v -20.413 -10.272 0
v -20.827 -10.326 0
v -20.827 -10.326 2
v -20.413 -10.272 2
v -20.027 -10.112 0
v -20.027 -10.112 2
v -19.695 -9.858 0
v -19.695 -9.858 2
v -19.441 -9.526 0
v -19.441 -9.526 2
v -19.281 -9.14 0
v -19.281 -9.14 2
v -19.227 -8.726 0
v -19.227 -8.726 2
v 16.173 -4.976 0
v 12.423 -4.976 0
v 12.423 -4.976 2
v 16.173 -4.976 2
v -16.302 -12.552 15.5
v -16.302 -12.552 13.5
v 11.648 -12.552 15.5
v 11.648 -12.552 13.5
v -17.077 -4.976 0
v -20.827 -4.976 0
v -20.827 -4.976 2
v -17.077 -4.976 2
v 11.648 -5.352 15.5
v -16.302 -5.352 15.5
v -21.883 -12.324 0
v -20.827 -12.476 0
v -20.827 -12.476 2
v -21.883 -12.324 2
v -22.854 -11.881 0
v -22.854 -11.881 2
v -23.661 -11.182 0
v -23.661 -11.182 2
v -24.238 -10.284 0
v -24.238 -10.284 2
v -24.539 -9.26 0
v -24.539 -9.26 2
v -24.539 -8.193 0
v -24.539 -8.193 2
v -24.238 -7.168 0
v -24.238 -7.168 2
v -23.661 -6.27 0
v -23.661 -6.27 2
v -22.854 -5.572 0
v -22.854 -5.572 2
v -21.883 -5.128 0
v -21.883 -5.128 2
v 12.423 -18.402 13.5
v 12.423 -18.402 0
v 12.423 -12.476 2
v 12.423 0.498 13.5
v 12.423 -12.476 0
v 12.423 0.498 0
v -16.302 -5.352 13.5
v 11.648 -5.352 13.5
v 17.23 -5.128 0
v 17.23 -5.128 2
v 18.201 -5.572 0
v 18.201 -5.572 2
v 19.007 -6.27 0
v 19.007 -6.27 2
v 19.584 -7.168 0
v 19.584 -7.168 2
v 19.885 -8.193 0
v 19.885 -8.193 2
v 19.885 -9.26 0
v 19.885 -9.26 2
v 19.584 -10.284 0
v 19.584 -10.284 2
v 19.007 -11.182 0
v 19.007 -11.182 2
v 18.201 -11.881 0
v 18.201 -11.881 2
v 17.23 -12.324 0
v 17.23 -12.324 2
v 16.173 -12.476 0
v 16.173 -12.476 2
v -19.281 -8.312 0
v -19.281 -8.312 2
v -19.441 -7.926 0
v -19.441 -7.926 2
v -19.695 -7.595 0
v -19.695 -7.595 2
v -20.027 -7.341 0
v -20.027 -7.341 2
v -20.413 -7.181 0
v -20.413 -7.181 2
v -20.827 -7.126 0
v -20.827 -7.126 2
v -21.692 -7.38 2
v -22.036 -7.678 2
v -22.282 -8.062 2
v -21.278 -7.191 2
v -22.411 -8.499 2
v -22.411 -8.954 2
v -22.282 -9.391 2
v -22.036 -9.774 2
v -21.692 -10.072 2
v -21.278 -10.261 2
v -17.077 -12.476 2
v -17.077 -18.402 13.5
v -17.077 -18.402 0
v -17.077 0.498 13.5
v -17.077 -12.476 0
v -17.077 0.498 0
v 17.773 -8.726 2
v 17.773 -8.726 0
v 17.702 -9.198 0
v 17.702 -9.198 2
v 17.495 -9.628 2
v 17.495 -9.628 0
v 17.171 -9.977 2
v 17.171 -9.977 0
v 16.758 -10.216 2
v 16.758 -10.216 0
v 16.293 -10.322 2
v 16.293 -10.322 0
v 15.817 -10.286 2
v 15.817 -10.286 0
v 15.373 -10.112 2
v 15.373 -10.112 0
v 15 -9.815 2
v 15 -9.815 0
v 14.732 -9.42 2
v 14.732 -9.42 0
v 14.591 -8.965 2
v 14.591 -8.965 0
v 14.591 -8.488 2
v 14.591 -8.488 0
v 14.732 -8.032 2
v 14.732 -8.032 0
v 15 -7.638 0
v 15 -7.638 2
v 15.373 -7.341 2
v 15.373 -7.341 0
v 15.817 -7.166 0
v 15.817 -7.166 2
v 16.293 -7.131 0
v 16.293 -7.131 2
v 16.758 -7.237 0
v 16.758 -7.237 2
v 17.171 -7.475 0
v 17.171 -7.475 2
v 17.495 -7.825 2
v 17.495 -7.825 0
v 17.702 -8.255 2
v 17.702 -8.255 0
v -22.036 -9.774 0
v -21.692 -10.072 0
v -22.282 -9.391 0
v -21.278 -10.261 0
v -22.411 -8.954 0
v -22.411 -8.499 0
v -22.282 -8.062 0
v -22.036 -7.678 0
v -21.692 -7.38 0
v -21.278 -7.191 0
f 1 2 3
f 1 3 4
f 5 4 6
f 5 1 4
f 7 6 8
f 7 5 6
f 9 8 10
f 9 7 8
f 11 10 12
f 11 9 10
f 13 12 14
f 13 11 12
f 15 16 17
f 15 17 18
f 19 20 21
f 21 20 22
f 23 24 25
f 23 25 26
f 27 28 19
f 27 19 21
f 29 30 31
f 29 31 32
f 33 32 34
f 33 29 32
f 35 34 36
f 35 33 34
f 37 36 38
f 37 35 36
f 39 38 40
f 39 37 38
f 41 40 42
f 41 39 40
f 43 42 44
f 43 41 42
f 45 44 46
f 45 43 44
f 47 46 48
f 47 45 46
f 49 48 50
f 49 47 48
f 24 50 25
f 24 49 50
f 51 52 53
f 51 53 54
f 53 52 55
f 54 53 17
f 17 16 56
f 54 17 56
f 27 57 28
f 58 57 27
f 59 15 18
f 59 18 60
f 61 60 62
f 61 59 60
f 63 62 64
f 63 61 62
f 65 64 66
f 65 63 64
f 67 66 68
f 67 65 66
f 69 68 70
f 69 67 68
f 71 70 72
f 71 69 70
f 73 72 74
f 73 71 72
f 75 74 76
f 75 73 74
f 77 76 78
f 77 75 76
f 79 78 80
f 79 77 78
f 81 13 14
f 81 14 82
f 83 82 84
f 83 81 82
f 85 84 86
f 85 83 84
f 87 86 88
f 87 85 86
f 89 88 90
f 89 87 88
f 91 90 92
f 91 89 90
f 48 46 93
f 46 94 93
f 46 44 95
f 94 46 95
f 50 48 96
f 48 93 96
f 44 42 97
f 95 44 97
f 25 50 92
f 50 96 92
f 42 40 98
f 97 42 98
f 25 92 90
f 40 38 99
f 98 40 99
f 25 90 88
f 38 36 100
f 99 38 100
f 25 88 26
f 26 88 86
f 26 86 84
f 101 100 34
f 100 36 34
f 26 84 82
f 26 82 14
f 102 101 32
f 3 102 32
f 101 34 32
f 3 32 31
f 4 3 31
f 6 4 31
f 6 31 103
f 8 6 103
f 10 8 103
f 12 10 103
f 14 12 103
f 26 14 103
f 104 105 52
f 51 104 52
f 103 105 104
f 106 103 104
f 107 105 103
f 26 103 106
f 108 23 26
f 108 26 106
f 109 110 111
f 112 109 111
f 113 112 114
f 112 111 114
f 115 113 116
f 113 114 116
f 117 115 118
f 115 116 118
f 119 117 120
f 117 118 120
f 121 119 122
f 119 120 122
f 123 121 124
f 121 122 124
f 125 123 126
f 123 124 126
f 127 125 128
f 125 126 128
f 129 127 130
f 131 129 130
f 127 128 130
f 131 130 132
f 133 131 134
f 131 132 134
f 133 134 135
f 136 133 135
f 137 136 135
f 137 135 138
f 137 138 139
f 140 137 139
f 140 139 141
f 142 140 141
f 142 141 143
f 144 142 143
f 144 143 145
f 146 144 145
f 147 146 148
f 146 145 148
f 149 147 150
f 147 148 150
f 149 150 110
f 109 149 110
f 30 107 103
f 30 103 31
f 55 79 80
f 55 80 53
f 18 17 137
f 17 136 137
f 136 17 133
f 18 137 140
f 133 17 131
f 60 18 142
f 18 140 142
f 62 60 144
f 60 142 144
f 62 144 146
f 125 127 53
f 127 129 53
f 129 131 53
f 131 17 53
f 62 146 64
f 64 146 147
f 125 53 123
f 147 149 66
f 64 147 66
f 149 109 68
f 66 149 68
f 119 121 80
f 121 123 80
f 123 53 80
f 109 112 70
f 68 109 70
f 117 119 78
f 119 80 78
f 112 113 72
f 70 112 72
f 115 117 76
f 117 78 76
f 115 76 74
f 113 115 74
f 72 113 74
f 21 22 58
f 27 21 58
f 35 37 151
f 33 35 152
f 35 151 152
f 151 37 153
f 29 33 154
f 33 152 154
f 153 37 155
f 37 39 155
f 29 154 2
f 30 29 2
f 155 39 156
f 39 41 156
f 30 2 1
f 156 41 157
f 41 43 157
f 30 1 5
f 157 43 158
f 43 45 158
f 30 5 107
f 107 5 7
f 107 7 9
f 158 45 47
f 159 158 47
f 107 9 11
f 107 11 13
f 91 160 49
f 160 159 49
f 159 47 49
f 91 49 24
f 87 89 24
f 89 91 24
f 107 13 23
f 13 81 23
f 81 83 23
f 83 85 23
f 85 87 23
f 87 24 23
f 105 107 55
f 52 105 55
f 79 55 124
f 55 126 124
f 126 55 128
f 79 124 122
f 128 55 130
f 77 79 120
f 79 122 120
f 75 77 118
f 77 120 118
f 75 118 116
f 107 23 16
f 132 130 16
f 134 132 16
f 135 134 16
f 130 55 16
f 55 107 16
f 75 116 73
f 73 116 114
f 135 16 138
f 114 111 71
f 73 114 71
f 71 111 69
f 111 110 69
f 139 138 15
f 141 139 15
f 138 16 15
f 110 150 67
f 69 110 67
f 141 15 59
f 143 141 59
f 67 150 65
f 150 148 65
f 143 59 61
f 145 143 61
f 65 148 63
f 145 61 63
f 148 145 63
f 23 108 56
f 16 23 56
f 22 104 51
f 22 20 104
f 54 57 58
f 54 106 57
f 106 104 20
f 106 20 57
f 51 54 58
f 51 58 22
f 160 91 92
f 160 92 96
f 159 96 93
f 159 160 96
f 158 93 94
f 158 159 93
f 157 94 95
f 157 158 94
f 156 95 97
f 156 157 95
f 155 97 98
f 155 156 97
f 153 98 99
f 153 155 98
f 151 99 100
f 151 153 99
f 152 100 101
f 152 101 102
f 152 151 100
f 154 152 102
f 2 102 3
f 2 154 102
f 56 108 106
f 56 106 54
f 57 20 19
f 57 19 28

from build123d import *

# Parameters (mm, degrees)
F0_W     = 29.5
F0_H     = 18.9
F1_DEPTH = 13.5
F2_R     = 1.6
F3_DEPTH = 2
F4_W     = 27.95
F4_H     = 7.2
F5_DEPTH = 2


with BuildPart() as f1:
    # F0 (on Top) → F1 (new body)
    with BuildSketch(Plane.XY):
        with Locations((-2.3268059269, -8.9522809724)):
            Rectangle(F0_W, F0_H)
    extrude(amount=F1_DEPTH)

    # F2 (on face) → F3 (join)
    with BuildSketch(Plane(origin=(0, 0, 0), x_dir=(1, 0, 0), z_dir=(0, 0, -1))):
        with BuildLine():
            Line((-20.8268059269, 7.1262256302), (-20.8268059269, 4.9762256302))
            Line((-20.8268059269, 4.9762256302), (-17.0768059269, 4.9762256302))
            Line((-17.0768059269, 4.9762256302), (-17.0768059269, 12.4762256302))
            Line((-17.0768059269, 12.4762256302), (-20.8268059269, 12.4762256302))
            Line((-20.8268059269, 12.4762256302), (-20.8268059269, 10.3262256302))
            ThreePointArc((-20.8268059269, 10.3262256302), (-19.695435077, 9.8575964801), (-19.2268059269, 8.7262256302))
            ThreePointArc((-19.2268059269, 8.7262256302), (-19.695435077, 7.5948547803), (-20.8268059269, 7.1262256302))
        make_face()
        with BuildLine():
            ThreePointArc((-20.8268059269, 12.4762256302), (-24.5768059269, 8.7262256302), (-20.8268059269, 4.9762256302))
            Line((-20.8268059269, 4.9762256302), (-20.8268059269, 7.1262256302))
            ThreePointArc((-20.8268059269, 7.1262256302), (-22.4268059269, 8.7262256302), (-20.8268059269, 10.3262256302))
            Line((-20.8268059269, 10.3262256302), (-20.8268059269, 12.4762256302))
        make_face()
        with BuildLine():
            Line((12.4231940731, 12.4762256302), (12.4231940731, 4.9762256302))
            Line((12.4231940731, 4.9762256302), (16.1731940731, 4.9762256302))
            ThreePointArc((16.1731940731, 4.9762256302), (19.9231940731, 8.7262256302), (16.1731940731, 12.4762256302))
            Line((16.1731940731, 12.4762256302), (12.4231940731, 12.4762256302))
        make_face()
        with Locations((16.1731940731, 8.7262256302)):
            Circle(F2_R, mode=Mode.SUBTRACT)
    extrude(amount=-F3_DEPTH)

    # F4 (on face) → F5 (join)
    with BuildSketch(Plane.XY.offset(13.5)):
        with Locations((-2.3268059269, -8.9522809724)):
            Rectangle(F4_W, F4_H)
    extrude(amount=F5_DEPTH)


solid = f1.part
